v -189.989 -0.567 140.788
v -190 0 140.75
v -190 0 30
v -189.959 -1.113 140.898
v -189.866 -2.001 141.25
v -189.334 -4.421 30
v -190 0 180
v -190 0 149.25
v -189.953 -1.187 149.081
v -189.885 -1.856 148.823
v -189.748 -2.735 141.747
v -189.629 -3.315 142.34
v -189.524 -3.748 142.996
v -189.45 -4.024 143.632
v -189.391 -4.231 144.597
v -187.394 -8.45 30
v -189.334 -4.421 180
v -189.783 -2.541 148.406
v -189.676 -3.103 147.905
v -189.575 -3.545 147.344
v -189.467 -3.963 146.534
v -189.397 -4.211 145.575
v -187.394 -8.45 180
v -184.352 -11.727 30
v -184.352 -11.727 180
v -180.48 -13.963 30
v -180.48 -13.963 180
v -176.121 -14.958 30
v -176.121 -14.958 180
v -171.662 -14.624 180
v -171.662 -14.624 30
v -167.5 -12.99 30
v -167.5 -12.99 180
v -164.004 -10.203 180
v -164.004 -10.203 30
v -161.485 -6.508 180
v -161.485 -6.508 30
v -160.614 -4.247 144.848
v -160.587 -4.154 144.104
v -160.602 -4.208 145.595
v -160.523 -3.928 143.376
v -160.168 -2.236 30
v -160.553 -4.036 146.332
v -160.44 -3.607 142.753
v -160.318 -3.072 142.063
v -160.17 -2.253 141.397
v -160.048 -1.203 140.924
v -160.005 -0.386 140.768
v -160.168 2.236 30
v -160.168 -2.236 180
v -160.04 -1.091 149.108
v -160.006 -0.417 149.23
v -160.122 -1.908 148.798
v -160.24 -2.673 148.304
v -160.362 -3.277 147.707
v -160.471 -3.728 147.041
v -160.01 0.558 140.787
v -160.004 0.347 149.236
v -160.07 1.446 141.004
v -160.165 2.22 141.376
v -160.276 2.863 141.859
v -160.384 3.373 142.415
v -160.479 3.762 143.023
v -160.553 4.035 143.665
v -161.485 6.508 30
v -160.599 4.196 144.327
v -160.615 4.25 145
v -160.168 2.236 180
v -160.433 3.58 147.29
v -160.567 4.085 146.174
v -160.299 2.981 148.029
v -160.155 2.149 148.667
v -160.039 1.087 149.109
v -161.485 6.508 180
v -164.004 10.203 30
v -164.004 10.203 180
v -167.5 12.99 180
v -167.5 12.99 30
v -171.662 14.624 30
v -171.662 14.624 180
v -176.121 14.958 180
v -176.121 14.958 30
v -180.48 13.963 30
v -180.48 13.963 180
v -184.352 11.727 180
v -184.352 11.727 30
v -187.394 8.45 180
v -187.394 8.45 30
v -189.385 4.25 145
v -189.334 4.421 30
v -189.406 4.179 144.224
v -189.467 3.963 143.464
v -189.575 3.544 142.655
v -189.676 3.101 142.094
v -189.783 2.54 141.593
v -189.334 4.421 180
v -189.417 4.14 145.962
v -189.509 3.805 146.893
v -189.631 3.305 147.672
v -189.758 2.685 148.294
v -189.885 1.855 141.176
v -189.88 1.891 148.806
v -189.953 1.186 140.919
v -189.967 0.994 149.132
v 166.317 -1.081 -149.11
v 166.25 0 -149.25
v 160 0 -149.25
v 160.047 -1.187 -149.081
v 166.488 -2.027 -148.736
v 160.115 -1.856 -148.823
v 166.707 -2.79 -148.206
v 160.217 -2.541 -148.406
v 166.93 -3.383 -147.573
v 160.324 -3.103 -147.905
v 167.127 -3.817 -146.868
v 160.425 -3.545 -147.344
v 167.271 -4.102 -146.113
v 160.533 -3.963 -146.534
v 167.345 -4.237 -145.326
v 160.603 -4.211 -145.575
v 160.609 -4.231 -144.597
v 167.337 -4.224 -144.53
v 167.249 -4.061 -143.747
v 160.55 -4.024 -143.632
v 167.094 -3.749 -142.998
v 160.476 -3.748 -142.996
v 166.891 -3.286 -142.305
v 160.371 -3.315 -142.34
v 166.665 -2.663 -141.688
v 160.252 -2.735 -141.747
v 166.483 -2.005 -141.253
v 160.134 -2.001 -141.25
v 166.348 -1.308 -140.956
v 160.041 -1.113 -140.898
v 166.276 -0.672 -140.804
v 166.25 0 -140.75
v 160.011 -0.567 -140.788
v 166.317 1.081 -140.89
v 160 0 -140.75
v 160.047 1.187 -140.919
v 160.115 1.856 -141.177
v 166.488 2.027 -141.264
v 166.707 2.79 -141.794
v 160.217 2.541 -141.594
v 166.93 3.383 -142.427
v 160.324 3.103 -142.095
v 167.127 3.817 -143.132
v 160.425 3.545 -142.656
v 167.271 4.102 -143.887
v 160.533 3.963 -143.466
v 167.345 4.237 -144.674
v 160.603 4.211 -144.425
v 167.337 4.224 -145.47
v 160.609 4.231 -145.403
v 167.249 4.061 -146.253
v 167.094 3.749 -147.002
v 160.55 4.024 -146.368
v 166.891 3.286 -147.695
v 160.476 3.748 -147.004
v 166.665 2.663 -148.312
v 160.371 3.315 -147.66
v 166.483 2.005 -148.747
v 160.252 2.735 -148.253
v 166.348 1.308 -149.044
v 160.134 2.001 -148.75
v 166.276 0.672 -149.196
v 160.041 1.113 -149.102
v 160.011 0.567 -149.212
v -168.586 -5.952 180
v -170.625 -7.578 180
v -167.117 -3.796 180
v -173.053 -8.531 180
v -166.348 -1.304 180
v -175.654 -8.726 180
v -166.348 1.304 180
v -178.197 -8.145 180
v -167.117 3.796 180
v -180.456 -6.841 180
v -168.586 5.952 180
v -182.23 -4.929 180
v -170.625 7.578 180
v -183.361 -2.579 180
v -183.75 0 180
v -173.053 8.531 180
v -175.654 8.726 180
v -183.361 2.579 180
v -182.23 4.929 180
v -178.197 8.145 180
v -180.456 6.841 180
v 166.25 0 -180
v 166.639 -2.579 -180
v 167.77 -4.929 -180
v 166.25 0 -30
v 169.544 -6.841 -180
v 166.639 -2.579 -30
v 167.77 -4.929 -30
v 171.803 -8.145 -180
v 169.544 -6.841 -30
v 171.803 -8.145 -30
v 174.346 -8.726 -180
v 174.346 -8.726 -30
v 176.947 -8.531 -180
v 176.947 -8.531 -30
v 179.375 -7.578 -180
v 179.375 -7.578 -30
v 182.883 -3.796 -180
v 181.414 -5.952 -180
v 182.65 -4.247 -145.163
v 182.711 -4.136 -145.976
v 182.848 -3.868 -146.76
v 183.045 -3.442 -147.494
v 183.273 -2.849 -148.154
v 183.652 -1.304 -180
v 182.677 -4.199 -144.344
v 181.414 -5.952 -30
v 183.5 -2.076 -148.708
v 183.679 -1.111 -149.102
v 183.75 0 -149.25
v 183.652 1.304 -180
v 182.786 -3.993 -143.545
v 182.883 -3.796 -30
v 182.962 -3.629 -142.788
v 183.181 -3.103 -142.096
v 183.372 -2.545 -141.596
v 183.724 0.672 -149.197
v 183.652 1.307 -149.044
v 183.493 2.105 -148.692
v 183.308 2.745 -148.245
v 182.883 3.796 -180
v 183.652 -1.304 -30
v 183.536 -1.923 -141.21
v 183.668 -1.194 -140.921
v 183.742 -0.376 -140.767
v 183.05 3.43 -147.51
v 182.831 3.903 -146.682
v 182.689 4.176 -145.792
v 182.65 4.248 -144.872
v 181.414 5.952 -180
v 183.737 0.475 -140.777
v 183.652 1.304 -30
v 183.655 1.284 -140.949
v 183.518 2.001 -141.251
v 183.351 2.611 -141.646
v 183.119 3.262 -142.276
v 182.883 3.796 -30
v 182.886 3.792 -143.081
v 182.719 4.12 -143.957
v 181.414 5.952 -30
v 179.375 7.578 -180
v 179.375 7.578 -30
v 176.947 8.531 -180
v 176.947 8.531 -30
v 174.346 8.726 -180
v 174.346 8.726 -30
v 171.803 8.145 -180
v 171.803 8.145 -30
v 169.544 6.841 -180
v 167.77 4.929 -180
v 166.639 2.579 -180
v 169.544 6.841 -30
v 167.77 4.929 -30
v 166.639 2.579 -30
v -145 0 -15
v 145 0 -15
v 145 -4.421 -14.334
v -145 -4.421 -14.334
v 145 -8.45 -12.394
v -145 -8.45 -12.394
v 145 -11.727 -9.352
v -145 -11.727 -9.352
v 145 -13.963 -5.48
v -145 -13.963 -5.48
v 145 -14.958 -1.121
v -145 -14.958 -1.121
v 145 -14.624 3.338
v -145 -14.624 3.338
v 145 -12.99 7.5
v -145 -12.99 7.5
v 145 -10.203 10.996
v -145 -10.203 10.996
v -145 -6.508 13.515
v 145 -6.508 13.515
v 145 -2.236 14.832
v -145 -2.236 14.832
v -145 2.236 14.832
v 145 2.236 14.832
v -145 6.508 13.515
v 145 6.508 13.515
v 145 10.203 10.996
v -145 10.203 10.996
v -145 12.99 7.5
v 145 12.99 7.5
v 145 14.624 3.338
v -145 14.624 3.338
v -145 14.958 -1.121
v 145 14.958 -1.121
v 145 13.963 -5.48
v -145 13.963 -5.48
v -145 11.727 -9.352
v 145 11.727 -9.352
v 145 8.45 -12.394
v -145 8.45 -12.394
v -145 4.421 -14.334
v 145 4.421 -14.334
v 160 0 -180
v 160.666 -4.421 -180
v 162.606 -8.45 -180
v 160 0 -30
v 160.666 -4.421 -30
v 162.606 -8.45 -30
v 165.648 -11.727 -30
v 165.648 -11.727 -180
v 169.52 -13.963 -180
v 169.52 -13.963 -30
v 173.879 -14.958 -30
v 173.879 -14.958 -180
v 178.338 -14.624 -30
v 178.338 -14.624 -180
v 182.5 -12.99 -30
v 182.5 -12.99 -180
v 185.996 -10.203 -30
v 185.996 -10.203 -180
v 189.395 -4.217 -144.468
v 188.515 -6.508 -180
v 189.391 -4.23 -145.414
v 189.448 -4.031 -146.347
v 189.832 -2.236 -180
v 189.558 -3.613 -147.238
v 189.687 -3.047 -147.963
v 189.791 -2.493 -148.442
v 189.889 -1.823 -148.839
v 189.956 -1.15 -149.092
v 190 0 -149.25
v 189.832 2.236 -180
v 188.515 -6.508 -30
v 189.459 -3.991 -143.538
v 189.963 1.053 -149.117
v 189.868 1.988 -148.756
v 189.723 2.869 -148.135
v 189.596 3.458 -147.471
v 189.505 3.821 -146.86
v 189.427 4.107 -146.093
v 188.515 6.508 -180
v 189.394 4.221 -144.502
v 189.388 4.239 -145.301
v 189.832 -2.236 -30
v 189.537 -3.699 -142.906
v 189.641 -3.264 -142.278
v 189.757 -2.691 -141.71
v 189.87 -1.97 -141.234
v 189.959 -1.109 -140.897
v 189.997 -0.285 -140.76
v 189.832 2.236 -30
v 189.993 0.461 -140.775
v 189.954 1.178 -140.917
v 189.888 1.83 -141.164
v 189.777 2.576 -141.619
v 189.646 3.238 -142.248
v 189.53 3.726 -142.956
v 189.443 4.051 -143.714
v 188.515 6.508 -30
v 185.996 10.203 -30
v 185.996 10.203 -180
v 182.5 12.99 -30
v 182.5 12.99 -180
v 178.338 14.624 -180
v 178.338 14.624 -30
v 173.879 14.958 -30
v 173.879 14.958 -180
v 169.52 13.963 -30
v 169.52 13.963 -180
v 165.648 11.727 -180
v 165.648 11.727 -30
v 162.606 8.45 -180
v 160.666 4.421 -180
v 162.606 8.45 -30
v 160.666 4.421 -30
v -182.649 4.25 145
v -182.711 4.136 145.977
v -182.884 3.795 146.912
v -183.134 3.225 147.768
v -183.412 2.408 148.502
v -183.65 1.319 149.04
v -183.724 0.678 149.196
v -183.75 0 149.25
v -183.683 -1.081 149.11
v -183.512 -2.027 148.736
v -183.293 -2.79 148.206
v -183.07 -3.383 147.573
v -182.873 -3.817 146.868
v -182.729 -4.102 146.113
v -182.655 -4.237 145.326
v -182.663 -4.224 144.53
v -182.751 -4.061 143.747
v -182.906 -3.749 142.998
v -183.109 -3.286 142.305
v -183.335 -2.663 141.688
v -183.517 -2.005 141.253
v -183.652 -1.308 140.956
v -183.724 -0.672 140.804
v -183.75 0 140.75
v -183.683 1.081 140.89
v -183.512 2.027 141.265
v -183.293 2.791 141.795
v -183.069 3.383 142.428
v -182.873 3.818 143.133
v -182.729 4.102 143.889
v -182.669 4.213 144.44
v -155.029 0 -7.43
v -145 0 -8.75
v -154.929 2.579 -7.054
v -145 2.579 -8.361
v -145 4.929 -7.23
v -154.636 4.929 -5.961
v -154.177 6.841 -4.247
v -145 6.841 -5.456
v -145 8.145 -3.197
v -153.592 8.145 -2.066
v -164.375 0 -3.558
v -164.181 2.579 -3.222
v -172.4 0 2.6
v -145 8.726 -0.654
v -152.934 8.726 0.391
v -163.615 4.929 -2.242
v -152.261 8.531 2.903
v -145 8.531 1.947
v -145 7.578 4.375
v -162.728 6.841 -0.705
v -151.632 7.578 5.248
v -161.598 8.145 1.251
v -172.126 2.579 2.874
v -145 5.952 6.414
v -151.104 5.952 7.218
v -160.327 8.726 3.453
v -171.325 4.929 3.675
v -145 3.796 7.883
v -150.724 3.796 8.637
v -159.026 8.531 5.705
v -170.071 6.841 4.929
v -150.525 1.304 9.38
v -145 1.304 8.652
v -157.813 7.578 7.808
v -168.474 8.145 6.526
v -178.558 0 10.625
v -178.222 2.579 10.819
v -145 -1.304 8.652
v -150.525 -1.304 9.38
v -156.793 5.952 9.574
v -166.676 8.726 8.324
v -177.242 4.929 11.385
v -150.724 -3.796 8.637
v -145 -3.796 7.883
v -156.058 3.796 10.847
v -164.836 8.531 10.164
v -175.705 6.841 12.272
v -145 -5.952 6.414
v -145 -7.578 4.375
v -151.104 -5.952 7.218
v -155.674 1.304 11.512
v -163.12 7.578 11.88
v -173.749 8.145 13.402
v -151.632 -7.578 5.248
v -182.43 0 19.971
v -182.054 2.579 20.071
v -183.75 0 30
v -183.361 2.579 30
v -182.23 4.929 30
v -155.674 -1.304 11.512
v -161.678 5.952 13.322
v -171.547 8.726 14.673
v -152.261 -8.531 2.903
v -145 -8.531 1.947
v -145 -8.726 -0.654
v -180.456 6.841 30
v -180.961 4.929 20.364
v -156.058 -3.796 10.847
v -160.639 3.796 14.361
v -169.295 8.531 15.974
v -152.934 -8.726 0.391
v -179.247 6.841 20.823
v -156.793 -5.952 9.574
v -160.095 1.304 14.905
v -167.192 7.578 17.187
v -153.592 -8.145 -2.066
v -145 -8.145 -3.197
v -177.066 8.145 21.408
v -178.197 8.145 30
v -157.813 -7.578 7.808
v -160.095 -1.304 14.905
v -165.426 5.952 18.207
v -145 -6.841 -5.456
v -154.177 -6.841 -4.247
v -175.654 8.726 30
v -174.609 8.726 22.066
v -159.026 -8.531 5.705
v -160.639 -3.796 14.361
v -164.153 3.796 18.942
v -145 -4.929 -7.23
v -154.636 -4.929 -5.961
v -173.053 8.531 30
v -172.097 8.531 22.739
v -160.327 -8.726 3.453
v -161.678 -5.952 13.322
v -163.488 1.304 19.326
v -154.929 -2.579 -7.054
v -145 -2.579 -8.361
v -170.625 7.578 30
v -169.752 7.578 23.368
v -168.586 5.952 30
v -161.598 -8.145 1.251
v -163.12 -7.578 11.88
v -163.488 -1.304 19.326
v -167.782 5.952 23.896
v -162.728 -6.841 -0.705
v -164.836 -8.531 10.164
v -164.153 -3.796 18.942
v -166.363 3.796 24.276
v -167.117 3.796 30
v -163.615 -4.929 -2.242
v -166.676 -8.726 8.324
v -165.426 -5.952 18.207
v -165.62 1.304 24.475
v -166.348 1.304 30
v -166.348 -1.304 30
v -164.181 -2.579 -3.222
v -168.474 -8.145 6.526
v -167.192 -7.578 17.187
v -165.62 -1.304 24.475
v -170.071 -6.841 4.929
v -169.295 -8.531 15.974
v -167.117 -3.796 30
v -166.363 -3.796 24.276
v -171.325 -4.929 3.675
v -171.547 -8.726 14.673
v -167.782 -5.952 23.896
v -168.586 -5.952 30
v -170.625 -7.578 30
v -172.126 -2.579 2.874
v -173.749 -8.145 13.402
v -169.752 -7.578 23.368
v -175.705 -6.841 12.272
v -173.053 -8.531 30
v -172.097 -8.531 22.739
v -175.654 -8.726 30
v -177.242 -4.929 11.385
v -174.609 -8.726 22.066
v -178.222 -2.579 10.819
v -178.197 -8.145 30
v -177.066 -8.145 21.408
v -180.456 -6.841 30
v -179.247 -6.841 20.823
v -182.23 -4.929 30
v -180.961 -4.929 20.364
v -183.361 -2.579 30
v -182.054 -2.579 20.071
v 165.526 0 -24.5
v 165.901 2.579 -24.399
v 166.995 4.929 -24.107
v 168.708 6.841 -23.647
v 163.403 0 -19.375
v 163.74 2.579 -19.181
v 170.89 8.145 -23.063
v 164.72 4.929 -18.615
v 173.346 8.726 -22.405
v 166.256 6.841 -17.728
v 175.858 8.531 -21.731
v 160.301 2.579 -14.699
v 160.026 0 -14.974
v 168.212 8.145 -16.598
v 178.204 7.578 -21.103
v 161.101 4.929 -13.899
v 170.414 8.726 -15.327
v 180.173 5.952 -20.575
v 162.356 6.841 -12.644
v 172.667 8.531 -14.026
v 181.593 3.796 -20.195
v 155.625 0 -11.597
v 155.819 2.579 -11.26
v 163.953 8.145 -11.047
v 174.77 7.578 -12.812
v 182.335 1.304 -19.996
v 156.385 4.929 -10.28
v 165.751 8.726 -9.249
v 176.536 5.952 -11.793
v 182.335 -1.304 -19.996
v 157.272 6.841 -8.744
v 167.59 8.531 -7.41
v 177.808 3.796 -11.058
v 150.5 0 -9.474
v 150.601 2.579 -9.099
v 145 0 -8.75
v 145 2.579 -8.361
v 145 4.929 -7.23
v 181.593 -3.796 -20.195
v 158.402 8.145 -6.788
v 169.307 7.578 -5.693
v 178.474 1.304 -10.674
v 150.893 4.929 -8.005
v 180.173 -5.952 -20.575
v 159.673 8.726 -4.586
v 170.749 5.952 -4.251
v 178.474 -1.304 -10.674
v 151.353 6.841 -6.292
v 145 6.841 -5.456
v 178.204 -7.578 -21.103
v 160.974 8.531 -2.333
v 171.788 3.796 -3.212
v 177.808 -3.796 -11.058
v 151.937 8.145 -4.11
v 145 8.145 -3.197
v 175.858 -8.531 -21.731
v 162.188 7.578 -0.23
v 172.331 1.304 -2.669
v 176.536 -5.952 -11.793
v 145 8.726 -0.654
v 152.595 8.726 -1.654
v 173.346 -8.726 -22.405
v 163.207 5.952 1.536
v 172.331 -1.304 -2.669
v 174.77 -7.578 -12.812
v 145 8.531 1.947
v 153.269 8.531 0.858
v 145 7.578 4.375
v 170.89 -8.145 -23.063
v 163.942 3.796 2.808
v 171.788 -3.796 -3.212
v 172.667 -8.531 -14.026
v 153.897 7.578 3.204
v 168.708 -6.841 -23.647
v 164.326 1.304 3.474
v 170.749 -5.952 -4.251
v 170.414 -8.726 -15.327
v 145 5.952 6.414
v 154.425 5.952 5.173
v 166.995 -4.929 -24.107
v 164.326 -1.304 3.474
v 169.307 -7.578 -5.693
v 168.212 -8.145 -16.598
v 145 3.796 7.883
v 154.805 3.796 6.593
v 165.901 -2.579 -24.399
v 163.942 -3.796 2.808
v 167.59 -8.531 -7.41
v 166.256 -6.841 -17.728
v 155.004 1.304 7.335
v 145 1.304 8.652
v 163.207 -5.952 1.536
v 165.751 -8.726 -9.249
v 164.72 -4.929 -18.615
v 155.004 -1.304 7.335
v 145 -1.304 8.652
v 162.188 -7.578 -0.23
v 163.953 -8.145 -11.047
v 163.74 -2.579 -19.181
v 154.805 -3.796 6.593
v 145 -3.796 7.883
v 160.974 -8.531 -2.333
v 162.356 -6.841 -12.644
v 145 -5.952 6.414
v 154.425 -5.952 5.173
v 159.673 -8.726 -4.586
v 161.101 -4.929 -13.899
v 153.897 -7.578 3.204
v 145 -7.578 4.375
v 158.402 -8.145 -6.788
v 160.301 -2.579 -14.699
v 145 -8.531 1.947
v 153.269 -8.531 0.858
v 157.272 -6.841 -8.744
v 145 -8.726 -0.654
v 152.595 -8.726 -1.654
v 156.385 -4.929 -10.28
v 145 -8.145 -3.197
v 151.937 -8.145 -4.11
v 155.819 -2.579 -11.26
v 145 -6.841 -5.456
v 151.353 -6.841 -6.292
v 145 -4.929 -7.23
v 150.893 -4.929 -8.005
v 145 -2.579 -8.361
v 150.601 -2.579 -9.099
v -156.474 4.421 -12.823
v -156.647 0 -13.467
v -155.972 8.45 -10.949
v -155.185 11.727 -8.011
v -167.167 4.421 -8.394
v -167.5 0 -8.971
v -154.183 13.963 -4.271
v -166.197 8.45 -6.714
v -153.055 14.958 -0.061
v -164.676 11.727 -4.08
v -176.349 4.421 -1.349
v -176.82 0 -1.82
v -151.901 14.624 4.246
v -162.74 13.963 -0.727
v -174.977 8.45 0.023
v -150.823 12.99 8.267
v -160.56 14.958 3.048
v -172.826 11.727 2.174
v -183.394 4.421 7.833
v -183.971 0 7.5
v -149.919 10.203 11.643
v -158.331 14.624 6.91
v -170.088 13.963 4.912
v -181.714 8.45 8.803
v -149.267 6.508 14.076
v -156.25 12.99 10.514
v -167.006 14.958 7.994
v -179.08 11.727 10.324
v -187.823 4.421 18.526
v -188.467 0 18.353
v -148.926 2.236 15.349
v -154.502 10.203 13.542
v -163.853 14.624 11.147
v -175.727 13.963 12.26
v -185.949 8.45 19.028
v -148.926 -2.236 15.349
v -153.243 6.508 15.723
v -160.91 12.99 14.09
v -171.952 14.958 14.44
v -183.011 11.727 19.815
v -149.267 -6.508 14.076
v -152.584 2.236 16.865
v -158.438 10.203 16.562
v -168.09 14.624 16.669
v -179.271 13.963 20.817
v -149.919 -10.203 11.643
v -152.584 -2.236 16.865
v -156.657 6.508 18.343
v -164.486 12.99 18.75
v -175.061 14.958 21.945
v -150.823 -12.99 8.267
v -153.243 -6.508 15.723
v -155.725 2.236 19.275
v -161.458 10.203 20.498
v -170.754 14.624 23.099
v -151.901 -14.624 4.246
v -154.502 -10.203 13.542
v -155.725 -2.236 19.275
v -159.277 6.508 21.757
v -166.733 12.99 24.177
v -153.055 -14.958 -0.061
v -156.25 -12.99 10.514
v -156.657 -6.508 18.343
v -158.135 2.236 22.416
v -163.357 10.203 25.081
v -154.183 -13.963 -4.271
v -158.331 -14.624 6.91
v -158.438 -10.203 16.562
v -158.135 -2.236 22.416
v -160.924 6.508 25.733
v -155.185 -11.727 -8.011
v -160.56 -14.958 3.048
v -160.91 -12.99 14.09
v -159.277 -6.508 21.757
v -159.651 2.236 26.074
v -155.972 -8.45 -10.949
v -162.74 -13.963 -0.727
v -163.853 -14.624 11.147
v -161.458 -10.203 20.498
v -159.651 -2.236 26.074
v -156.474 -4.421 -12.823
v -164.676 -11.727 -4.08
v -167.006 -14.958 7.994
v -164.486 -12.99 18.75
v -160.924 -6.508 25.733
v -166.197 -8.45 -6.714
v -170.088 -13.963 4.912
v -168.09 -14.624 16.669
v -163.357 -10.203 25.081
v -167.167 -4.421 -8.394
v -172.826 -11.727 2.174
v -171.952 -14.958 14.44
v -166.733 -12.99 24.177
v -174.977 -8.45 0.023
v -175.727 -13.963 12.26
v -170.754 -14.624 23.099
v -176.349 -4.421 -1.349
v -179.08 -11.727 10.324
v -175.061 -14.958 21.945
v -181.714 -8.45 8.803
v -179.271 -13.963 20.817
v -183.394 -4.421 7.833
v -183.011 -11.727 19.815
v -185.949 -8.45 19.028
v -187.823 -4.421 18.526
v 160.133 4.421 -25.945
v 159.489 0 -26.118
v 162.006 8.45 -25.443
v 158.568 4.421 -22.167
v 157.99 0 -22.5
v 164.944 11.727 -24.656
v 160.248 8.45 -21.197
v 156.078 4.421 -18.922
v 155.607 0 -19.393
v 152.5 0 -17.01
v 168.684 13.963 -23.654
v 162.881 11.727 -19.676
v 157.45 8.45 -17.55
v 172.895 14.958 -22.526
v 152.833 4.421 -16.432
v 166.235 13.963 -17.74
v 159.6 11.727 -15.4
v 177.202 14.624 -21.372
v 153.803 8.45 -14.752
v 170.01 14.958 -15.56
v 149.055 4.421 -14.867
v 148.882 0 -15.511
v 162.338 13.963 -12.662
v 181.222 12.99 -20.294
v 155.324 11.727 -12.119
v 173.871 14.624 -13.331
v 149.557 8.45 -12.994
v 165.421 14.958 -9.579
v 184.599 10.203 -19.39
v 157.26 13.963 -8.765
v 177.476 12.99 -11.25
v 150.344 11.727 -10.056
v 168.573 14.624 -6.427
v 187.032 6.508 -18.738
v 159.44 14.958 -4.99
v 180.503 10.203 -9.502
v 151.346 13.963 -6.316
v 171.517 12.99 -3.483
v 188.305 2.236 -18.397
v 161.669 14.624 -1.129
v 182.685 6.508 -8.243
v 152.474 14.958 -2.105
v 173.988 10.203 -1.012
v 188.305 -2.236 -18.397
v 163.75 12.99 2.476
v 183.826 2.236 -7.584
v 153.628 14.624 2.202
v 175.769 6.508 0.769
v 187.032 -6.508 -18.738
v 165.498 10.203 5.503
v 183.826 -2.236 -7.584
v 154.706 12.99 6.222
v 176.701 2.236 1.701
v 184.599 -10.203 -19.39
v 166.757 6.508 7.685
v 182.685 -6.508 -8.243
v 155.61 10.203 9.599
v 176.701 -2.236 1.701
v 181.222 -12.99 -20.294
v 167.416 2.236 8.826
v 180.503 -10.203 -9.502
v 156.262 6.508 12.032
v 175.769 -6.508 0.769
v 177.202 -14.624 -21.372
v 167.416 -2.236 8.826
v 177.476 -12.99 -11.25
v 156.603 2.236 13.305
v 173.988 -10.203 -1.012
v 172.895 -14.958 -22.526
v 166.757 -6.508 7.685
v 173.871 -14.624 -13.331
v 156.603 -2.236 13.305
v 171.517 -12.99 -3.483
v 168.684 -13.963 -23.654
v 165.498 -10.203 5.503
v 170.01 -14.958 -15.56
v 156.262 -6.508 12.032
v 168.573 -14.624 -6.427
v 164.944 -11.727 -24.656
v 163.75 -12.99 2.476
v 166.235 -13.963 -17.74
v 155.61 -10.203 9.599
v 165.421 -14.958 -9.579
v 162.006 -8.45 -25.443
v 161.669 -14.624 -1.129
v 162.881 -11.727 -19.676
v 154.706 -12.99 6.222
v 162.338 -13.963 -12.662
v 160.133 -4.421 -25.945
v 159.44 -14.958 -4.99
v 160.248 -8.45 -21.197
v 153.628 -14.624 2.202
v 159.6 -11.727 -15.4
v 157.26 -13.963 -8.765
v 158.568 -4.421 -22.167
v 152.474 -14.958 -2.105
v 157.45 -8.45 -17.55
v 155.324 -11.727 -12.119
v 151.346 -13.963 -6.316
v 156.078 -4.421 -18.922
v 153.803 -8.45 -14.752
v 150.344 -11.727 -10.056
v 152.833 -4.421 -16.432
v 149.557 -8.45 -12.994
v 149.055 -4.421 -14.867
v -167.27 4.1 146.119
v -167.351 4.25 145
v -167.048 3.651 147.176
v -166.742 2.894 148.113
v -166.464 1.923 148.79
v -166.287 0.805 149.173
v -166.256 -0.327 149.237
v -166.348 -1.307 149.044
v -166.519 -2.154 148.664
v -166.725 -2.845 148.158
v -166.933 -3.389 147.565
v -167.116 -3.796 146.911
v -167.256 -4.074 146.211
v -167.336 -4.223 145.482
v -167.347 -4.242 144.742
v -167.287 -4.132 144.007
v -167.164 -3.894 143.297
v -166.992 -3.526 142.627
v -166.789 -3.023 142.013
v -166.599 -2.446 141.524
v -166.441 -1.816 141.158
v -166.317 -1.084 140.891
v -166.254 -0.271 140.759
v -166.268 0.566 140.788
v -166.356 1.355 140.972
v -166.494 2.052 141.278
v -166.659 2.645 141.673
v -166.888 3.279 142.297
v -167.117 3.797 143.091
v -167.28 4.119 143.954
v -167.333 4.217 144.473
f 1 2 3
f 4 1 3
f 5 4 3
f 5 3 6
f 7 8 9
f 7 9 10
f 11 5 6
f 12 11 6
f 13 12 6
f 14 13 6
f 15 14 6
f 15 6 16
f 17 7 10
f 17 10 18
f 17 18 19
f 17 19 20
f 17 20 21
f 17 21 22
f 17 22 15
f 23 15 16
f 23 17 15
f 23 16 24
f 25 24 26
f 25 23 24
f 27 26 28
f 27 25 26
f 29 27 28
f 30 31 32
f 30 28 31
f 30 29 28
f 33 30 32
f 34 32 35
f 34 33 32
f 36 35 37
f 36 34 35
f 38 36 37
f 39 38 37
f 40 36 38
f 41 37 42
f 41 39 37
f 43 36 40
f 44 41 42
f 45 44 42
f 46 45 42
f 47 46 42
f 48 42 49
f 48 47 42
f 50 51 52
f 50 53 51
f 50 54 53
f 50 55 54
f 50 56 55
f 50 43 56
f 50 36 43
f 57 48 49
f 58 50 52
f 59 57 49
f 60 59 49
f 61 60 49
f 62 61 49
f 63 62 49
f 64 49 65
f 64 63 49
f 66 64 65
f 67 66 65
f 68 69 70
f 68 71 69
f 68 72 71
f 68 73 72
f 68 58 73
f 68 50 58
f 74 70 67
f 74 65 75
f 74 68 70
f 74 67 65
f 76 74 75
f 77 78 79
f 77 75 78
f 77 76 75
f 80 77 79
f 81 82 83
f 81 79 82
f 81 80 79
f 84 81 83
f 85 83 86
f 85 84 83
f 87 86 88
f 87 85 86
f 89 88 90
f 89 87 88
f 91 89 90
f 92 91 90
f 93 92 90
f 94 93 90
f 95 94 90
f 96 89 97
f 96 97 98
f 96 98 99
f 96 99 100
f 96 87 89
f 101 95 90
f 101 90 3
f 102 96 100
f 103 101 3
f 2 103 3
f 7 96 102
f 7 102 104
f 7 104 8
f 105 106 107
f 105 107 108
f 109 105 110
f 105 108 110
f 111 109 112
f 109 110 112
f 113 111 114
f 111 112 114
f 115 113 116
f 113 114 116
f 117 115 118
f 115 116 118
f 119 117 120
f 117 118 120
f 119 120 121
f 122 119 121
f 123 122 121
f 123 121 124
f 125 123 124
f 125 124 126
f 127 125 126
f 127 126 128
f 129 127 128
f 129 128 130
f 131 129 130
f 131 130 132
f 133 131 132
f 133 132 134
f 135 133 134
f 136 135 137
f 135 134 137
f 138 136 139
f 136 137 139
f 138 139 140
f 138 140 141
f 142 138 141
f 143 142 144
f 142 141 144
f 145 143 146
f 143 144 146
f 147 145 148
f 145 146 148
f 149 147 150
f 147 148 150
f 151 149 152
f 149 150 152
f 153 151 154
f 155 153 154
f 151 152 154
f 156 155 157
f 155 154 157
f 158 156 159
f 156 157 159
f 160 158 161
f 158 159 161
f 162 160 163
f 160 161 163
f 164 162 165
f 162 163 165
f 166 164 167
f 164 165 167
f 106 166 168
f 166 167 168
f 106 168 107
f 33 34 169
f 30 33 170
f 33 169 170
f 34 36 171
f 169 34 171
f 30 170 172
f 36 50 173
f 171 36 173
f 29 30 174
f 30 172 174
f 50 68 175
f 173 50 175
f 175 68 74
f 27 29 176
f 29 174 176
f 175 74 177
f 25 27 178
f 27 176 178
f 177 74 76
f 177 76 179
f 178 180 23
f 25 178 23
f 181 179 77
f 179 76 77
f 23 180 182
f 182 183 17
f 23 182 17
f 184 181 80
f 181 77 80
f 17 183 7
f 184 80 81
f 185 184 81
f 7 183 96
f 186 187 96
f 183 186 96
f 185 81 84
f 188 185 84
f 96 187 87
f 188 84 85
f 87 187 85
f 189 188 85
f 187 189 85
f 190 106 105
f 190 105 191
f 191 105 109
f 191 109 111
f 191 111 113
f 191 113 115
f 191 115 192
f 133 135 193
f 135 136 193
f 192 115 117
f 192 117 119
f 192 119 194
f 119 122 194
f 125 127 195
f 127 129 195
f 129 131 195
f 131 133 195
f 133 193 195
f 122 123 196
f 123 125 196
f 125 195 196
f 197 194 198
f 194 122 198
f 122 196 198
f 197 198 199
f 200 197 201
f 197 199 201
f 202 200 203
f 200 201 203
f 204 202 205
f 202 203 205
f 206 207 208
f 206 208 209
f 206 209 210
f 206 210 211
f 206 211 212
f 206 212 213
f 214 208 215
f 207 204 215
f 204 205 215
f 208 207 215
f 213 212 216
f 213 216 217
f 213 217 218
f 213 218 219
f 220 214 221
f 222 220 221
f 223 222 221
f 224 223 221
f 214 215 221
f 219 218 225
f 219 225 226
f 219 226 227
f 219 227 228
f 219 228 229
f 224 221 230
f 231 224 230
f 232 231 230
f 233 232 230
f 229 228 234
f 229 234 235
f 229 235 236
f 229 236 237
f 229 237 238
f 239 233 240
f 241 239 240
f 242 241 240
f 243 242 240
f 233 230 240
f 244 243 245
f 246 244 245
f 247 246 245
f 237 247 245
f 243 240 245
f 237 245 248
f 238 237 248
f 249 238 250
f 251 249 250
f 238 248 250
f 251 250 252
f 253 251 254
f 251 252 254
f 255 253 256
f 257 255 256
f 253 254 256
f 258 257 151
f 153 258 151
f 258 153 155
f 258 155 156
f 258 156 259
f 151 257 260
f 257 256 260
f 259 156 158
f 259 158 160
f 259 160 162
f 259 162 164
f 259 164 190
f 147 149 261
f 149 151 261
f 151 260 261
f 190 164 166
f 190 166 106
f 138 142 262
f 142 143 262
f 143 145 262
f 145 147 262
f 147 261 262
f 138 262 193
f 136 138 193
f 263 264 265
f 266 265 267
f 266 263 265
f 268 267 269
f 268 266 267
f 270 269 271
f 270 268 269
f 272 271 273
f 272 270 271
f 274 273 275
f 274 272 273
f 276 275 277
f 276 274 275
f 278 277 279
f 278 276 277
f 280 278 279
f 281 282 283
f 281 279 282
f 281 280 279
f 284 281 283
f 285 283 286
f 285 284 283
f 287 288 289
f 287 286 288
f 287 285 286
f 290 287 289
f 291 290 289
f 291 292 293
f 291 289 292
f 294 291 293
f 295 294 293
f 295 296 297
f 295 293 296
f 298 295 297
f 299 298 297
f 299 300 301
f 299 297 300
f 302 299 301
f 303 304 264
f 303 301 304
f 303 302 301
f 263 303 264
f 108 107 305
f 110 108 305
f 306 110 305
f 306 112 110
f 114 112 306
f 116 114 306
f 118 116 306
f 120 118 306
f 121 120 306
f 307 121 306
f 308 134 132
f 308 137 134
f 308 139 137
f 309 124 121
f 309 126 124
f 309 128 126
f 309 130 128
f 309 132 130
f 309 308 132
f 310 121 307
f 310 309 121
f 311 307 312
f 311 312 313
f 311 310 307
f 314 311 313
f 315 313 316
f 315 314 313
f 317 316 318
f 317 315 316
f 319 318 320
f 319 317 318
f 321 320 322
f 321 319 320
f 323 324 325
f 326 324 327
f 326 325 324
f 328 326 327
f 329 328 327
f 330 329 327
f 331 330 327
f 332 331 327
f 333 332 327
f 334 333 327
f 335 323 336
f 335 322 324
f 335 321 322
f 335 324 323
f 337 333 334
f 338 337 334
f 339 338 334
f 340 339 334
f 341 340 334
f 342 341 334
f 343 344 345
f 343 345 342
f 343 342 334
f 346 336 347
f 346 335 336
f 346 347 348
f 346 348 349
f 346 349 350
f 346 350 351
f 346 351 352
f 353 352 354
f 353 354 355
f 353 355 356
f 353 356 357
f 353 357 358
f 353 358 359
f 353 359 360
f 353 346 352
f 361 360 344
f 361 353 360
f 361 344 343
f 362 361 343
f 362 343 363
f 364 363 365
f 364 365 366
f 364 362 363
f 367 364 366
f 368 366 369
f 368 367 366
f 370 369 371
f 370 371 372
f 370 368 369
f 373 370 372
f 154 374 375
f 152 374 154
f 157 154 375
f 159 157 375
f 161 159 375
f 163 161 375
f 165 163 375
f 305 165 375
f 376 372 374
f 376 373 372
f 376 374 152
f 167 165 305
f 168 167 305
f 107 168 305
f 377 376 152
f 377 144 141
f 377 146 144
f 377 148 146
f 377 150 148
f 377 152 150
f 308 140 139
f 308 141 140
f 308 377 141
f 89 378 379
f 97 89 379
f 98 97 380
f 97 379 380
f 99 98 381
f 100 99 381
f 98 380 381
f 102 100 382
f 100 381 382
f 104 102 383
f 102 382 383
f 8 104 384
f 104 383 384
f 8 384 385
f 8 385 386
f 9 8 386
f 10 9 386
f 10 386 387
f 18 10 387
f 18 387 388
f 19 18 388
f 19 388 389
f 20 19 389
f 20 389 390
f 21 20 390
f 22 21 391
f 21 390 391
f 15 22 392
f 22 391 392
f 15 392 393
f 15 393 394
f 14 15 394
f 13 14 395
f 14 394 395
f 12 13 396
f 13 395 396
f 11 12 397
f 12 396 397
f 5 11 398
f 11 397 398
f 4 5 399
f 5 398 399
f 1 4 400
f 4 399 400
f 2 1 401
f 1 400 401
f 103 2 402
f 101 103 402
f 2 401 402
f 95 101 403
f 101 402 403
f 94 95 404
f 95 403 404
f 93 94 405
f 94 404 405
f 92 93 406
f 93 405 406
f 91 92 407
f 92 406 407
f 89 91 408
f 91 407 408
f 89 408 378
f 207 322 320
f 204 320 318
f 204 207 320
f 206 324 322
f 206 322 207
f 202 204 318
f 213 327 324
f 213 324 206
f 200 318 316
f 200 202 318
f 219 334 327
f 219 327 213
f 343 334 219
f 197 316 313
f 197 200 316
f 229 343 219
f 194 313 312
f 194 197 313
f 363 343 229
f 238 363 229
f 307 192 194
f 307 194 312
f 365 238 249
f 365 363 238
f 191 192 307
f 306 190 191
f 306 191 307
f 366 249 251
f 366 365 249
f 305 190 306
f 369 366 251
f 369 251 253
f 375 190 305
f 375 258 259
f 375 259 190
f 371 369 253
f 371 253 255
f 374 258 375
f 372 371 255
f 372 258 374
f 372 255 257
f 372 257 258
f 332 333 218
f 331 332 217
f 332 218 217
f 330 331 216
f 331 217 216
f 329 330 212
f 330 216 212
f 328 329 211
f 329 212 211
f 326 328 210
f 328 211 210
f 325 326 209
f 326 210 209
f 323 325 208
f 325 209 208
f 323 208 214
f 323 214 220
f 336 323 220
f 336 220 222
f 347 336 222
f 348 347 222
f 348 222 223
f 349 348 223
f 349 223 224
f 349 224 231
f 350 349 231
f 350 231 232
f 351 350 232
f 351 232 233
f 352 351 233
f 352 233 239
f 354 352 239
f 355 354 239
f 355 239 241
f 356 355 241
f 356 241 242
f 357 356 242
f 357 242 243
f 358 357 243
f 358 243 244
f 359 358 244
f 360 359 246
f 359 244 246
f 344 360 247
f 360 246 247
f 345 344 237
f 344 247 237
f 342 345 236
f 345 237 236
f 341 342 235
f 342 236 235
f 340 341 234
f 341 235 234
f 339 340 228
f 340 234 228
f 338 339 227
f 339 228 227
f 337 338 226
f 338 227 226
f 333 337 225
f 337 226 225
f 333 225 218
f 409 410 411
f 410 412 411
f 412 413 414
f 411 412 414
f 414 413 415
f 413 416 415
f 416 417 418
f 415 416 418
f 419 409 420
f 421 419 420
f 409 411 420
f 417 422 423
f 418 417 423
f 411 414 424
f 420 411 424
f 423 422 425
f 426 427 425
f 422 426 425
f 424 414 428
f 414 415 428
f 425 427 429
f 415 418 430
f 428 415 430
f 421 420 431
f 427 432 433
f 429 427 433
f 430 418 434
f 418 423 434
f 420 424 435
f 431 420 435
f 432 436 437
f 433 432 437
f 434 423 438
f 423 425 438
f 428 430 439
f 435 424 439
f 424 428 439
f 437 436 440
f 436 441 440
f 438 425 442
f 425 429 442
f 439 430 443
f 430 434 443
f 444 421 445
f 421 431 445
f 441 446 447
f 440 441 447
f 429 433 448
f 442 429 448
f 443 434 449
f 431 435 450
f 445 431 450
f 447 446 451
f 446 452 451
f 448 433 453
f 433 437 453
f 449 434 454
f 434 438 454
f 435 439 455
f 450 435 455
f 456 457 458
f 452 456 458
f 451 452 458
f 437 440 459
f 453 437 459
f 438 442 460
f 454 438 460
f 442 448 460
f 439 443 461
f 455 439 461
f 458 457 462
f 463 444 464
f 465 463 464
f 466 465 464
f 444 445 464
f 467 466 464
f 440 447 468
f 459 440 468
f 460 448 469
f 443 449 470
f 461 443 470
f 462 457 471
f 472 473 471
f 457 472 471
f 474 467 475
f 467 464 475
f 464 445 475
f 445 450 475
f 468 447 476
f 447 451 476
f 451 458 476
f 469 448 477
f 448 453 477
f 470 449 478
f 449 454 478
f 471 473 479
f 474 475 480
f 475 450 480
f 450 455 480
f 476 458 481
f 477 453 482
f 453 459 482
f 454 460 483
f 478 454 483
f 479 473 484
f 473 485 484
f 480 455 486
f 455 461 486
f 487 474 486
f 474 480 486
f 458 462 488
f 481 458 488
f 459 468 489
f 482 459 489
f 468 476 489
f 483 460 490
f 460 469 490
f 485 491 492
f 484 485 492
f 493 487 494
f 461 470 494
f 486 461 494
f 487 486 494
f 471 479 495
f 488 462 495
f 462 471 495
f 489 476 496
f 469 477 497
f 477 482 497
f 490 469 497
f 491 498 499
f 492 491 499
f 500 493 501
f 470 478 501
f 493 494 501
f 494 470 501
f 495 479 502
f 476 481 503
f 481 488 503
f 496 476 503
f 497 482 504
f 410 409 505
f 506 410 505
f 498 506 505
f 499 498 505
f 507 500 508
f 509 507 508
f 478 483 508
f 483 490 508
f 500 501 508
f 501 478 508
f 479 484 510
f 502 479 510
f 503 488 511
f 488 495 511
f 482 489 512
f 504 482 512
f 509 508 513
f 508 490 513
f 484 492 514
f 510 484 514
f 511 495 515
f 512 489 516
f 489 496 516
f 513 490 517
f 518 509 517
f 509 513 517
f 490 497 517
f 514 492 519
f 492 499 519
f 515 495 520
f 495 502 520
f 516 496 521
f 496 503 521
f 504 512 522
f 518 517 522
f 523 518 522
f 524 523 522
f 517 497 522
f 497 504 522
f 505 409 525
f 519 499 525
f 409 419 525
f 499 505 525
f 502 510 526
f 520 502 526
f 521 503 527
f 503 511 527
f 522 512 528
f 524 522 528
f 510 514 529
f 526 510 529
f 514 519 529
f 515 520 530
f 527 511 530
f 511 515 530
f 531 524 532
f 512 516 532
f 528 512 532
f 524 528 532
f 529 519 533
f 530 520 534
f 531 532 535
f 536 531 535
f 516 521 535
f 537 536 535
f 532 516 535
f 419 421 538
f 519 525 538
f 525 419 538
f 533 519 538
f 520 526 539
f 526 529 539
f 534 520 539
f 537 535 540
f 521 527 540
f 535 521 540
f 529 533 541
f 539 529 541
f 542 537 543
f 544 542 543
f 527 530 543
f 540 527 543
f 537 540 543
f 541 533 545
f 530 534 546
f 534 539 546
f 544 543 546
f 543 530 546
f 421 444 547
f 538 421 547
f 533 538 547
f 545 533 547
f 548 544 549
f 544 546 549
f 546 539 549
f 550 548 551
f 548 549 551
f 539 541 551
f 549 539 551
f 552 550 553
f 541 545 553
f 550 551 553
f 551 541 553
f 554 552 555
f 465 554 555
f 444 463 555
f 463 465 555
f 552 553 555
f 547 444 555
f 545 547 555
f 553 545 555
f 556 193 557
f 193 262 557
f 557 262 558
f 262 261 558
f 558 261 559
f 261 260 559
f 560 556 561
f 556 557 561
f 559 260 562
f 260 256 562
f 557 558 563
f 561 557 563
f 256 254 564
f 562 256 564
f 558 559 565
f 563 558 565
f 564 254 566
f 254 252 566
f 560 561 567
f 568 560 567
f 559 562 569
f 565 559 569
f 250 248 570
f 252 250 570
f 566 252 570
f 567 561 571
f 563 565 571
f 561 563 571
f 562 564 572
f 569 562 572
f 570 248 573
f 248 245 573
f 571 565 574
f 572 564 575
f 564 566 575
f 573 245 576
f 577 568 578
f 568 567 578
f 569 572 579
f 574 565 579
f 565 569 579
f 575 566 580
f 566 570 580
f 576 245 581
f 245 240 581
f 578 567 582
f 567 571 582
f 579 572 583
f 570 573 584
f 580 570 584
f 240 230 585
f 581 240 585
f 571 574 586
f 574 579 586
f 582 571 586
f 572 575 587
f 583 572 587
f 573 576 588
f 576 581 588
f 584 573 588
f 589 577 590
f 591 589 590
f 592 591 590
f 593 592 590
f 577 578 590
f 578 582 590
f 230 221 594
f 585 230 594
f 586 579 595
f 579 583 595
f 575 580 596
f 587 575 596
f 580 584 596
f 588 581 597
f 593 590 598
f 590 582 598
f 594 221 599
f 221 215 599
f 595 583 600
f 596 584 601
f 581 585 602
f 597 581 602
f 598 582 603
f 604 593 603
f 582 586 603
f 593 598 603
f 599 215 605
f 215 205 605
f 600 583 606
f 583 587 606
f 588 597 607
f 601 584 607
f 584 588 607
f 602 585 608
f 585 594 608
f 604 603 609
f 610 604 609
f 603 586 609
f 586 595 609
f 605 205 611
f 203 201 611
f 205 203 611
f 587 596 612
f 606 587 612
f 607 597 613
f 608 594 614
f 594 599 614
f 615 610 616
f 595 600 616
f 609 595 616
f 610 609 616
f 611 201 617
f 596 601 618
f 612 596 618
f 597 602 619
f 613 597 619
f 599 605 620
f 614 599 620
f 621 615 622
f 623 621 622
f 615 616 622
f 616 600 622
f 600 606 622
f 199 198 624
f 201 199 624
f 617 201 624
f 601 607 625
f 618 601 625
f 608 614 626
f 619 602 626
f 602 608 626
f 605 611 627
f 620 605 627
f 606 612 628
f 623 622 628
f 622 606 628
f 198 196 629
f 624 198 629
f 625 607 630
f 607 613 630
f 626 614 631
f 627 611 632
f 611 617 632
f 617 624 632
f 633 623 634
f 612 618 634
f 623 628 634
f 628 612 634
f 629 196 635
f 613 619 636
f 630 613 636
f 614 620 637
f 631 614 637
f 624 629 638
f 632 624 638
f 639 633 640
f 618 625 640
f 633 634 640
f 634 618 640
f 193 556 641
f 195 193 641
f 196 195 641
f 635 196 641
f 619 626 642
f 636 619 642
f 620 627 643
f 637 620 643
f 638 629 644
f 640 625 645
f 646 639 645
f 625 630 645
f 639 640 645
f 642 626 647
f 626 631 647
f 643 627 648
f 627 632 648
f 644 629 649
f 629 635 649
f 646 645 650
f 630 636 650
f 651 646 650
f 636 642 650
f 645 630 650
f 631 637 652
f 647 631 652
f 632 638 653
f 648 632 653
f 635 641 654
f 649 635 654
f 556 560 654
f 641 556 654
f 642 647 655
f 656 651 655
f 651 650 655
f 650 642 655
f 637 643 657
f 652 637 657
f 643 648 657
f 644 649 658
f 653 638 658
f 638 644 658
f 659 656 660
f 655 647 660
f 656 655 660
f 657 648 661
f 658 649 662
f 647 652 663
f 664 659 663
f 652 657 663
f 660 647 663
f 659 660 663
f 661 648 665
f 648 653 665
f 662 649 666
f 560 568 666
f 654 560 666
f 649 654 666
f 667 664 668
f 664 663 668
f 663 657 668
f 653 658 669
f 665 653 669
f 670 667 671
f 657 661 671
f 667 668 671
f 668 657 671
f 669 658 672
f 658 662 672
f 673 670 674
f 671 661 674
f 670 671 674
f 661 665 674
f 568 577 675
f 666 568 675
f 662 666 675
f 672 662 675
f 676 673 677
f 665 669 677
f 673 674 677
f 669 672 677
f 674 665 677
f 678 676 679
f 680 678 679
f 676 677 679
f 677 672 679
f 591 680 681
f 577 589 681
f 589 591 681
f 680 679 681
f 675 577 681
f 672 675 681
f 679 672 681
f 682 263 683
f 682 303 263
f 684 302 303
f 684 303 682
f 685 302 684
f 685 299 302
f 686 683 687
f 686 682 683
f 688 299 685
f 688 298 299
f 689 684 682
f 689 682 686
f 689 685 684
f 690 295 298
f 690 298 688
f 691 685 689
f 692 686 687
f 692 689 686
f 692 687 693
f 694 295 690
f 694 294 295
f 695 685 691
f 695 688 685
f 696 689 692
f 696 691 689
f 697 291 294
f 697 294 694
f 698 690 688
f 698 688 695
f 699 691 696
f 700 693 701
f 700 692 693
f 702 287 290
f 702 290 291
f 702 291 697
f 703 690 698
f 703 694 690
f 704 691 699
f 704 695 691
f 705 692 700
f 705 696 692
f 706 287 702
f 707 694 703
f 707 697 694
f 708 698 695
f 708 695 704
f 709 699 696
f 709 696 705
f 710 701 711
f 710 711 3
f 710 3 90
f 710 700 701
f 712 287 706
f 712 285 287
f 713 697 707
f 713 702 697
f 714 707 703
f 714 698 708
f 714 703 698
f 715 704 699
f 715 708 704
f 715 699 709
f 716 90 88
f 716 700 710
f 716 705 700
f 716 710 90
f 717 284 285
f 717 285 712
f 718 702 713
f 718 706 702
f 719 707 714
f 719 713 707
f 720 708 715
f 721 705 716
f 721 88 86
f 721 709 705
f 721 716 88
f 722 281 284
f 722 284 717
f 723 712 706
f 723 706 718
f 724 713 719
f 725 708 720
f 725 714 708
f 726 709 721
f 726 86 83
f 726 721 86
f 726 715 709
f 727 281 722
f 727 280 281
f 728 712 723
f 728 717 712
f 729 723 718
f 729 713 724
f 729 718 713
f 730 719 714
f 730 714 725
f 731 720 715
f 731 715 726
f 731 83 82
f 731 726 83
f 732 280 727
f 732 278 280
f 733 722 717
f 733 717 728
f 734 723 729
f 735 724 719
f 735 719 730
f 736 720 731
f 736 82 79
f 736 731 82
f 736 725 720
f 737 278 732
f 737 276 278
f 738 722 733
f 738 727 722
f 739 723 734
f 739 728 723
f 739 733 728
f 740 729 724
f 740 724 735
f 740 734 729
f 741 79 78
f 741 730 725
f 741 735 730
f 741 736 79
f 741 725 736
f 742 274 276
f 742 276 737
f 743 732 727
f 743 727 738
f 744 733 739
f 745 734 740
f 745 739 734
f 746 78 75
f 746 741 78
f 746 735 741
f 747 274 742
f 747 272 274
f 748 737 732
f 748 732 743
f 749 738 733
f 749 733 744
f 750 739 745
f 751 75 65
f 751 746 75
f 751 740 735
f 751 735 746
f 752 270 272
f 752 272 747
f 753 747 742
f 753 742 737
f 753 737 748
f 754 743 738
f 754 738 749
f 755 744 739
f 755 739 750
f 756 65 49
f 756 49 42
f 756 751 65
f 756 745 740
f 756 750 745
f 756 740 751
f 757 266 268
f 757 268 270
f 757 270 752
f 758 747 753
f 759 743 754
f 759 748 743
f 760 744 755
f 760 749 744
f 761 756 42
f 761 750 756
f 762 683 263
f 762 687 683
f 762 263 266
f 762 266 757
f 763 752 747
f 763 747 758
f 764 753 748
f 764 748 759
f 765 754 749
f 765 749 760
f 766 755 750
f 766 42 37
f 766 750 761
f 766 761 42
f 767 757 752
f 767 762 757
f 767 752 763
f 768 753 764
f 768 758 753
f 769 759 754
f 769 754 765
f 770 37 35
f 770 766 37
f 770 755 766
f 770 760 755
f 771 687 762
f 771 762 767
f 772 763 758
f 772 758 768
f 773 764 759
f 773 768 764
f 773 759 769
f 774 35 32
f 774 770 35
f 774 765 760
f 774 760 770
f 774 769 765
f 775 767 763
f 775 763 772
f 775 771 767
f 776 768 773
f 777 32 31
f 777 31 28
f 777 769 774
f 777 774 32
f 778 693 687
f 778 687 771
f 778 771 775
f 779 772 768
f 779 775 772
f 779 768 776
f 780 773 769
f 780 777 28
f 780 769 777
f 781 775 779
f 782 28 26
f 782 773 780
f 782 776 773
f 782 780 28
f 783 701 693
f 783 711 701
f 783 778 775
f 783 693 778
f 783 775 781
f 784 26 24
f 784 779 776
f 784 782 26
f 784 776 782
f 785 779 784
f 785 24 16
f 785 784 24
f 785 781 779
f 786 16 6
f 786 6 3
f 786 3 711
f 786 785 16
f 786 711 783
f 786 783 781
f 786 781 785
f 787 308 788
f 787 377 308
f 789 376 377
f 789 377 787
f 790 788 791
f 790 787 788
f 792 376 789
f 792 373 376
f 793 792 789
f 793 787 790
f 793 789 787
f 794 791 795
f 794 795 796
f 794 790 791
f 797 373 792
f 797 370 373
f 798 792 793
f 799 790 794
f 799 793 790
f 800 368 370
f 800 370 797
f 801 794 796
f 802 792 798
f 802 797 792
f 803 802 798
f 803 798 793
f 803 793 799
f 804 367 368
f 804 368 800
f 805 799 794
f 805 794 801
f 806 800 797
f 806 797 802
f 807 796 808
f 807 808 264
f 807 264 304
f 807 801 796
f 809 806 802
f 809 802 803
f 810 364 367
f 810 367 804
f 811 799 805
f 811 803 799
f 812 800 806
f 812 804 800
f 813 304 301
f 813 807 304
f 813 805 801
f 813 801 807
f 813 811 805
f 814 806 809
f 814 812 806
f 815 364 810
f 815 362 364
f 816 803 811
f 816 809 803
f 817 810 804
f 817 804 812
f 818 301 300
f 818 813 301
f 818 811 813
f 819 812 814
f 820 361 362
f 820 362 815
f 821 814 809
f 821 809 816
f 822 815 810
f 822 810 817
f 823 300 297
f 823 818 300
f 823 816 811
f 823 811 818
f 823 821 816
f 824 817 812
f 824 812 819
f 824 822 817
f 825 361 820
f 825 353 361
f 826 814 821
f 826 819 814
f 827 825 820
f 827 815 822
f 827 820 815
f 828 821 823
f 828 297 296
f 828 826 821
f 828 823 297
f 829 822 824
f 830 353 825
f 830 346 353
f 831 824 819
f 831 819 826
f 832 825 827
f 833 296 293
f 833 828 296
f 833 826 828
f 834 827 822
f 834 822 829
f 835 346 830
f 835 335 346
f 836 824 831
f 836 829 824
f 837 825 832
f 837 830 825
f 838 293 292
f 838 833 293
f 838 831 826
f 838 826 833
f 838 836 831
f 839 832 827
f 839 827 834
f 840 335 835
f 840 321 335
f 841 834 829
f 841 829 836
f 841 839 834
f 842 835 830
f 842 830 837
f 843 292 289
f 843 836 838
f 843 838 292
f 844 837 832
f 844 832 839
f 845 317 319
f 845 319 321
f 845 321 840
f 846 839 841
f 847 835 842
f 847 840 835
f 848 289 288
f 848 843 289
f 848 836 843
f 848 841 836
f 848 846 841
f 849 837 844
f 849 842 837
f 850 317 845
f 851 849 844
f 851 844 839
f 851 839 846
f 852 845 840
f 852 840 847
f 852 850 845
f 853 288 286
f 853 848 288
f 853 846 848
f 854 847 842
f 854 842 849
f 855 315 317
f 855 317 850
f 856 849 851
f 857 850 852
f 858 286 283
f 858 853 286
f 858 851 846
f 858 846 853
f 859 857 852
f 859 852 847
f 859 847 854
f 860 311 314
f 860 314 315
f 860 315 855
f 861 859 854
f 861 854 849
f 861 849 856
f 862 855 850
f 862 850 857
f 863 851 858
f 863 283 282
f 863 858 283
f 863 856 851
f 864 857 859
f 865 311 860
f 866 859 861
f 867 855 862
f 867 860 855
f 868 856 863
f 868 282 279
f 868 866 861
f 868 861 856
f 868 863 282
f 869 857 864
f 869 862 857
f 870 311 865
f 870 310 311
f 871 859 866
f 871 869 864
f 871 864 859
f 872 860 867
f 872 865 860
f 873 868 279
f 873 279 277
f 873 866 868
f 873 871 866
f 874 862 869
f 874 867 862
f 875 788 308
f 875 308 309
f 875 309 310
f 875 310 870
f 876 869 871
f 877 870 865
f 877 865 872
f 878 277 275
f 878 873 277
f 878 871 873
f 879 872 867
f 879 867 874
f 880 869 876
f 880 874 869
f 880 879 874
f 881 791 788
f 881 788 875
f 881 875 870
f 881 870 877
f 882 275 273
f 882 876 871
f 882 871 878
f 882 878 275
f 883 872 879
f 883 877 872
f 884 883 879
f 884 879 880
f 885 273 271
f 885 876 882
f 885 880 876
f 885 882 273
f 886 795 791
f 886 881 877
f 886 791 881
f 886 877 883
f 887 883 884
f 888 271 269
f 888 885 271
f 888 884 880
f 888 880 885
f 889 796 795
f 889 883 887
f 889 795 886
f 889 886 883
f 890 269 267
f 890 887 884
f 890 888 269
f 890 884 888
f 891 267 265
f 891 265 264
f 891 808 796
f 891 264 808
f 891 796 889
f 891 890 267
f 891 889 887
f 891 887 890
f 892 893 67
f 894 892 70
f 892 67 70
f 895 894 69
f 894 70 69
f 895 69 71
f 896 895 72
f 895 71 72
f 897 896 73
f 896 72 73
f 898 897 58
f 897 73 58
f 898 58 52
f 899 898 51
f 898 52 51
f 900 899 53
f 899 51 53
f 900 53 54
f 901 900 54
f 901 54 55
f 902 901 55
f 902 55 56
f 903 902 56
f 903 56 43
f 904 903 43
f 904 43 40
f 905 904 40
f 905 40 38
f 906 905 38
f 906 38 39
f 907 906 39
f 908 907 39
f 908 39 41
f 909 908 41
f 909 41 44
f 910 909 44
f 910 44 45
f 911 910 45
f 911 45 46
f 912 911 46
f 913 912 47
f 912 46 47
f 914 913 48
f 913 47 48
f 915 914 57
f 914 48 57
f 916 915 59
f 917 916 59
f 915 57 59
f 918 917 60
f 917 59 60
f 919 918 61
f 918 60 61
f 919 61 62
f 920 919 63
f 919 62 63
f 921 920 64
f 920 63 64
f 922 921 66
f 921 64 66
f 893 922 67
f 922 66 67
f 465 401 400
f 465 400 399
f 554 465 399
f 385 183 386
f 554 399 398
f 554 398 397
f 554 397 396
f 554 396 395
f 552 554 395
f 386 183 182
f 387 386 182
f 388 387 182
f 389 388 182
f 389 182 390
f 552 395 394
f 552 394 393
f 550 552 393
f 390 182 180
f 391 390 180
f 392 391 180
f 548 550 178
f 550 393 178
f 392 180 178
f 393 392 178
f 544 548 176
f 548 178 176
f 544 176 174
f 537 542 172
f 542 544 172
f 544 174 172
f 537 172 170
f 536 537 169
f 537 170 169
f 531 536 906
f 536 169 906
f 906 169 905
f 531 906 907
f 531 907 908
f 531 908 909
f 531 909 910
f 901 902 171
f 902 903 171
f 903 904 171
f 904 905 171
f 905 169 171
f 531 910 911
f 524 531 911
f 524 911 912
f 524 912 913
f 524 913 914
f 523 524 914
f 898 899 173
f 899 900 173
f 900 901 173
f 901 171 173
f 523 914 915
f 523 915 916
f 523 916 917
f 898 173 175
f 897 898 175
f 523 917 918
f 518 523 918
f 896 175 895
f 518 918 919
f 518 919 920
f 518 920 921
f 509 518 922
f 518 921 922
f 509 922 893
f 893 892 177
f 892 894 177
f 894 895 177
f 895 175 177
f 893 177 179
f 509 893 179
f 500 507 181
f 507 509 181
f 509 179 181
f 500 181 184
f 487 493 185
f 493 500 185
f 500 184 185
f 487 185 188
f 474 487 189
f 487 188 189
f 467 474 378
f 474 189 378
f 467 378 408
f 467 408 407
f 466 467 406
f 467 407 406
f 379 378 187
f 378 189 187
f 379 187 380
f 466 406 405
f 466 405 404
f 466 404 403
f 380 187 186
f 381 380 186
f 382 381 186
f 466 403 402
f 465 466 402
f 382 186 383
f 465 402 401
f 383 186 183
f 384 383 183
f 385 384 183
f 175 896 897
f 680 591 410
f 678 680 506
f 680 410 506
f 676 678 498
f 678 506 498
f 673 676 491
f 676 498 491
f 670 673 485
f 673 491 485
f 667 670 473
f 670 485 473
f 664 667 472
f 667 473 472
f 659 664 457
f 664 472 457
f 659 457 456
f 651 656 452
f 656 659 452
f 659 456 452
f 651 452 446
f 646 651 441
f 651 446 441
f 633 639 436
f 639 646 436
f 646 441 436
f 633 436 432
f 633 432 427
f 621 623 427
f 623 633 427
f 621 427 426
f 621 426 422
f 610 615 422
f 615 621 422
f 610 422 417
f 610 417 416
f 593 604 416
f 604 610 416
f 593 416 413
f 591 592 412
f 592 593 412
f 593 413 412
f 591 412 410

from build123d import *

# Parameters (mm, degrees)
SKETCH2_R          = 15
SKETCH2_R_2        = 8.75
M10_TAPPED_HOLE1_D = 8.5
M10_TAPPED_HOLE2_D = 8.5


with BuildPart() as part:
    # Sweep1: sweep along a path in Sketch1
    with BuildLine(Plane(origin=(0, 0, 0), x_dir=(1, 0, 0), z_dir=(0, 1, 0))) as sweep1_path:
        Line((175, 180), (175, 30))
        ThreePointArc((175, 30), (166.213203436, 8.786796564), (145, 0))
        Line((145, 0), (-145, 0))
        ThreePointArc((-145, 0), (-166.213203436, -8.786796564), (-175, -30))
        Line((-175, -30), (-175, -180))
    # Sketch2 → Sweep1 (sweep)
    with BuildSketch(Plane(origin=(0, 0, 0), x_dir=(0, 0, -1), z_dir=(1, 0, 0))):
        Circle(SKETCH2_R)
        Circle(SKETCH2_R_2, mode=Mode.SUBTRACT)
    sweep(path=sweep1_path.line)

    # M10 Tapped Hole1 (through all)
    with Locations(Plane(origin=(-190, 0, 145), x_dir=(0, -1, 0), z_dir=(-1, 0, 0))):
        with Locations((0, 0)):
            Hole(M10_TAPPED_HOLE1_D / 2)

    # M10 Tapped Hole2 (through all)
    with Locations(Plane(origin=(190, 0, -145), x_dir=(0, 0, 1), z_dir=(1, 0, 0))):
        with Locations((0, 0)):
            Hole(M10_TAPPED_HOLE2_D / 2)


solid = part.part
